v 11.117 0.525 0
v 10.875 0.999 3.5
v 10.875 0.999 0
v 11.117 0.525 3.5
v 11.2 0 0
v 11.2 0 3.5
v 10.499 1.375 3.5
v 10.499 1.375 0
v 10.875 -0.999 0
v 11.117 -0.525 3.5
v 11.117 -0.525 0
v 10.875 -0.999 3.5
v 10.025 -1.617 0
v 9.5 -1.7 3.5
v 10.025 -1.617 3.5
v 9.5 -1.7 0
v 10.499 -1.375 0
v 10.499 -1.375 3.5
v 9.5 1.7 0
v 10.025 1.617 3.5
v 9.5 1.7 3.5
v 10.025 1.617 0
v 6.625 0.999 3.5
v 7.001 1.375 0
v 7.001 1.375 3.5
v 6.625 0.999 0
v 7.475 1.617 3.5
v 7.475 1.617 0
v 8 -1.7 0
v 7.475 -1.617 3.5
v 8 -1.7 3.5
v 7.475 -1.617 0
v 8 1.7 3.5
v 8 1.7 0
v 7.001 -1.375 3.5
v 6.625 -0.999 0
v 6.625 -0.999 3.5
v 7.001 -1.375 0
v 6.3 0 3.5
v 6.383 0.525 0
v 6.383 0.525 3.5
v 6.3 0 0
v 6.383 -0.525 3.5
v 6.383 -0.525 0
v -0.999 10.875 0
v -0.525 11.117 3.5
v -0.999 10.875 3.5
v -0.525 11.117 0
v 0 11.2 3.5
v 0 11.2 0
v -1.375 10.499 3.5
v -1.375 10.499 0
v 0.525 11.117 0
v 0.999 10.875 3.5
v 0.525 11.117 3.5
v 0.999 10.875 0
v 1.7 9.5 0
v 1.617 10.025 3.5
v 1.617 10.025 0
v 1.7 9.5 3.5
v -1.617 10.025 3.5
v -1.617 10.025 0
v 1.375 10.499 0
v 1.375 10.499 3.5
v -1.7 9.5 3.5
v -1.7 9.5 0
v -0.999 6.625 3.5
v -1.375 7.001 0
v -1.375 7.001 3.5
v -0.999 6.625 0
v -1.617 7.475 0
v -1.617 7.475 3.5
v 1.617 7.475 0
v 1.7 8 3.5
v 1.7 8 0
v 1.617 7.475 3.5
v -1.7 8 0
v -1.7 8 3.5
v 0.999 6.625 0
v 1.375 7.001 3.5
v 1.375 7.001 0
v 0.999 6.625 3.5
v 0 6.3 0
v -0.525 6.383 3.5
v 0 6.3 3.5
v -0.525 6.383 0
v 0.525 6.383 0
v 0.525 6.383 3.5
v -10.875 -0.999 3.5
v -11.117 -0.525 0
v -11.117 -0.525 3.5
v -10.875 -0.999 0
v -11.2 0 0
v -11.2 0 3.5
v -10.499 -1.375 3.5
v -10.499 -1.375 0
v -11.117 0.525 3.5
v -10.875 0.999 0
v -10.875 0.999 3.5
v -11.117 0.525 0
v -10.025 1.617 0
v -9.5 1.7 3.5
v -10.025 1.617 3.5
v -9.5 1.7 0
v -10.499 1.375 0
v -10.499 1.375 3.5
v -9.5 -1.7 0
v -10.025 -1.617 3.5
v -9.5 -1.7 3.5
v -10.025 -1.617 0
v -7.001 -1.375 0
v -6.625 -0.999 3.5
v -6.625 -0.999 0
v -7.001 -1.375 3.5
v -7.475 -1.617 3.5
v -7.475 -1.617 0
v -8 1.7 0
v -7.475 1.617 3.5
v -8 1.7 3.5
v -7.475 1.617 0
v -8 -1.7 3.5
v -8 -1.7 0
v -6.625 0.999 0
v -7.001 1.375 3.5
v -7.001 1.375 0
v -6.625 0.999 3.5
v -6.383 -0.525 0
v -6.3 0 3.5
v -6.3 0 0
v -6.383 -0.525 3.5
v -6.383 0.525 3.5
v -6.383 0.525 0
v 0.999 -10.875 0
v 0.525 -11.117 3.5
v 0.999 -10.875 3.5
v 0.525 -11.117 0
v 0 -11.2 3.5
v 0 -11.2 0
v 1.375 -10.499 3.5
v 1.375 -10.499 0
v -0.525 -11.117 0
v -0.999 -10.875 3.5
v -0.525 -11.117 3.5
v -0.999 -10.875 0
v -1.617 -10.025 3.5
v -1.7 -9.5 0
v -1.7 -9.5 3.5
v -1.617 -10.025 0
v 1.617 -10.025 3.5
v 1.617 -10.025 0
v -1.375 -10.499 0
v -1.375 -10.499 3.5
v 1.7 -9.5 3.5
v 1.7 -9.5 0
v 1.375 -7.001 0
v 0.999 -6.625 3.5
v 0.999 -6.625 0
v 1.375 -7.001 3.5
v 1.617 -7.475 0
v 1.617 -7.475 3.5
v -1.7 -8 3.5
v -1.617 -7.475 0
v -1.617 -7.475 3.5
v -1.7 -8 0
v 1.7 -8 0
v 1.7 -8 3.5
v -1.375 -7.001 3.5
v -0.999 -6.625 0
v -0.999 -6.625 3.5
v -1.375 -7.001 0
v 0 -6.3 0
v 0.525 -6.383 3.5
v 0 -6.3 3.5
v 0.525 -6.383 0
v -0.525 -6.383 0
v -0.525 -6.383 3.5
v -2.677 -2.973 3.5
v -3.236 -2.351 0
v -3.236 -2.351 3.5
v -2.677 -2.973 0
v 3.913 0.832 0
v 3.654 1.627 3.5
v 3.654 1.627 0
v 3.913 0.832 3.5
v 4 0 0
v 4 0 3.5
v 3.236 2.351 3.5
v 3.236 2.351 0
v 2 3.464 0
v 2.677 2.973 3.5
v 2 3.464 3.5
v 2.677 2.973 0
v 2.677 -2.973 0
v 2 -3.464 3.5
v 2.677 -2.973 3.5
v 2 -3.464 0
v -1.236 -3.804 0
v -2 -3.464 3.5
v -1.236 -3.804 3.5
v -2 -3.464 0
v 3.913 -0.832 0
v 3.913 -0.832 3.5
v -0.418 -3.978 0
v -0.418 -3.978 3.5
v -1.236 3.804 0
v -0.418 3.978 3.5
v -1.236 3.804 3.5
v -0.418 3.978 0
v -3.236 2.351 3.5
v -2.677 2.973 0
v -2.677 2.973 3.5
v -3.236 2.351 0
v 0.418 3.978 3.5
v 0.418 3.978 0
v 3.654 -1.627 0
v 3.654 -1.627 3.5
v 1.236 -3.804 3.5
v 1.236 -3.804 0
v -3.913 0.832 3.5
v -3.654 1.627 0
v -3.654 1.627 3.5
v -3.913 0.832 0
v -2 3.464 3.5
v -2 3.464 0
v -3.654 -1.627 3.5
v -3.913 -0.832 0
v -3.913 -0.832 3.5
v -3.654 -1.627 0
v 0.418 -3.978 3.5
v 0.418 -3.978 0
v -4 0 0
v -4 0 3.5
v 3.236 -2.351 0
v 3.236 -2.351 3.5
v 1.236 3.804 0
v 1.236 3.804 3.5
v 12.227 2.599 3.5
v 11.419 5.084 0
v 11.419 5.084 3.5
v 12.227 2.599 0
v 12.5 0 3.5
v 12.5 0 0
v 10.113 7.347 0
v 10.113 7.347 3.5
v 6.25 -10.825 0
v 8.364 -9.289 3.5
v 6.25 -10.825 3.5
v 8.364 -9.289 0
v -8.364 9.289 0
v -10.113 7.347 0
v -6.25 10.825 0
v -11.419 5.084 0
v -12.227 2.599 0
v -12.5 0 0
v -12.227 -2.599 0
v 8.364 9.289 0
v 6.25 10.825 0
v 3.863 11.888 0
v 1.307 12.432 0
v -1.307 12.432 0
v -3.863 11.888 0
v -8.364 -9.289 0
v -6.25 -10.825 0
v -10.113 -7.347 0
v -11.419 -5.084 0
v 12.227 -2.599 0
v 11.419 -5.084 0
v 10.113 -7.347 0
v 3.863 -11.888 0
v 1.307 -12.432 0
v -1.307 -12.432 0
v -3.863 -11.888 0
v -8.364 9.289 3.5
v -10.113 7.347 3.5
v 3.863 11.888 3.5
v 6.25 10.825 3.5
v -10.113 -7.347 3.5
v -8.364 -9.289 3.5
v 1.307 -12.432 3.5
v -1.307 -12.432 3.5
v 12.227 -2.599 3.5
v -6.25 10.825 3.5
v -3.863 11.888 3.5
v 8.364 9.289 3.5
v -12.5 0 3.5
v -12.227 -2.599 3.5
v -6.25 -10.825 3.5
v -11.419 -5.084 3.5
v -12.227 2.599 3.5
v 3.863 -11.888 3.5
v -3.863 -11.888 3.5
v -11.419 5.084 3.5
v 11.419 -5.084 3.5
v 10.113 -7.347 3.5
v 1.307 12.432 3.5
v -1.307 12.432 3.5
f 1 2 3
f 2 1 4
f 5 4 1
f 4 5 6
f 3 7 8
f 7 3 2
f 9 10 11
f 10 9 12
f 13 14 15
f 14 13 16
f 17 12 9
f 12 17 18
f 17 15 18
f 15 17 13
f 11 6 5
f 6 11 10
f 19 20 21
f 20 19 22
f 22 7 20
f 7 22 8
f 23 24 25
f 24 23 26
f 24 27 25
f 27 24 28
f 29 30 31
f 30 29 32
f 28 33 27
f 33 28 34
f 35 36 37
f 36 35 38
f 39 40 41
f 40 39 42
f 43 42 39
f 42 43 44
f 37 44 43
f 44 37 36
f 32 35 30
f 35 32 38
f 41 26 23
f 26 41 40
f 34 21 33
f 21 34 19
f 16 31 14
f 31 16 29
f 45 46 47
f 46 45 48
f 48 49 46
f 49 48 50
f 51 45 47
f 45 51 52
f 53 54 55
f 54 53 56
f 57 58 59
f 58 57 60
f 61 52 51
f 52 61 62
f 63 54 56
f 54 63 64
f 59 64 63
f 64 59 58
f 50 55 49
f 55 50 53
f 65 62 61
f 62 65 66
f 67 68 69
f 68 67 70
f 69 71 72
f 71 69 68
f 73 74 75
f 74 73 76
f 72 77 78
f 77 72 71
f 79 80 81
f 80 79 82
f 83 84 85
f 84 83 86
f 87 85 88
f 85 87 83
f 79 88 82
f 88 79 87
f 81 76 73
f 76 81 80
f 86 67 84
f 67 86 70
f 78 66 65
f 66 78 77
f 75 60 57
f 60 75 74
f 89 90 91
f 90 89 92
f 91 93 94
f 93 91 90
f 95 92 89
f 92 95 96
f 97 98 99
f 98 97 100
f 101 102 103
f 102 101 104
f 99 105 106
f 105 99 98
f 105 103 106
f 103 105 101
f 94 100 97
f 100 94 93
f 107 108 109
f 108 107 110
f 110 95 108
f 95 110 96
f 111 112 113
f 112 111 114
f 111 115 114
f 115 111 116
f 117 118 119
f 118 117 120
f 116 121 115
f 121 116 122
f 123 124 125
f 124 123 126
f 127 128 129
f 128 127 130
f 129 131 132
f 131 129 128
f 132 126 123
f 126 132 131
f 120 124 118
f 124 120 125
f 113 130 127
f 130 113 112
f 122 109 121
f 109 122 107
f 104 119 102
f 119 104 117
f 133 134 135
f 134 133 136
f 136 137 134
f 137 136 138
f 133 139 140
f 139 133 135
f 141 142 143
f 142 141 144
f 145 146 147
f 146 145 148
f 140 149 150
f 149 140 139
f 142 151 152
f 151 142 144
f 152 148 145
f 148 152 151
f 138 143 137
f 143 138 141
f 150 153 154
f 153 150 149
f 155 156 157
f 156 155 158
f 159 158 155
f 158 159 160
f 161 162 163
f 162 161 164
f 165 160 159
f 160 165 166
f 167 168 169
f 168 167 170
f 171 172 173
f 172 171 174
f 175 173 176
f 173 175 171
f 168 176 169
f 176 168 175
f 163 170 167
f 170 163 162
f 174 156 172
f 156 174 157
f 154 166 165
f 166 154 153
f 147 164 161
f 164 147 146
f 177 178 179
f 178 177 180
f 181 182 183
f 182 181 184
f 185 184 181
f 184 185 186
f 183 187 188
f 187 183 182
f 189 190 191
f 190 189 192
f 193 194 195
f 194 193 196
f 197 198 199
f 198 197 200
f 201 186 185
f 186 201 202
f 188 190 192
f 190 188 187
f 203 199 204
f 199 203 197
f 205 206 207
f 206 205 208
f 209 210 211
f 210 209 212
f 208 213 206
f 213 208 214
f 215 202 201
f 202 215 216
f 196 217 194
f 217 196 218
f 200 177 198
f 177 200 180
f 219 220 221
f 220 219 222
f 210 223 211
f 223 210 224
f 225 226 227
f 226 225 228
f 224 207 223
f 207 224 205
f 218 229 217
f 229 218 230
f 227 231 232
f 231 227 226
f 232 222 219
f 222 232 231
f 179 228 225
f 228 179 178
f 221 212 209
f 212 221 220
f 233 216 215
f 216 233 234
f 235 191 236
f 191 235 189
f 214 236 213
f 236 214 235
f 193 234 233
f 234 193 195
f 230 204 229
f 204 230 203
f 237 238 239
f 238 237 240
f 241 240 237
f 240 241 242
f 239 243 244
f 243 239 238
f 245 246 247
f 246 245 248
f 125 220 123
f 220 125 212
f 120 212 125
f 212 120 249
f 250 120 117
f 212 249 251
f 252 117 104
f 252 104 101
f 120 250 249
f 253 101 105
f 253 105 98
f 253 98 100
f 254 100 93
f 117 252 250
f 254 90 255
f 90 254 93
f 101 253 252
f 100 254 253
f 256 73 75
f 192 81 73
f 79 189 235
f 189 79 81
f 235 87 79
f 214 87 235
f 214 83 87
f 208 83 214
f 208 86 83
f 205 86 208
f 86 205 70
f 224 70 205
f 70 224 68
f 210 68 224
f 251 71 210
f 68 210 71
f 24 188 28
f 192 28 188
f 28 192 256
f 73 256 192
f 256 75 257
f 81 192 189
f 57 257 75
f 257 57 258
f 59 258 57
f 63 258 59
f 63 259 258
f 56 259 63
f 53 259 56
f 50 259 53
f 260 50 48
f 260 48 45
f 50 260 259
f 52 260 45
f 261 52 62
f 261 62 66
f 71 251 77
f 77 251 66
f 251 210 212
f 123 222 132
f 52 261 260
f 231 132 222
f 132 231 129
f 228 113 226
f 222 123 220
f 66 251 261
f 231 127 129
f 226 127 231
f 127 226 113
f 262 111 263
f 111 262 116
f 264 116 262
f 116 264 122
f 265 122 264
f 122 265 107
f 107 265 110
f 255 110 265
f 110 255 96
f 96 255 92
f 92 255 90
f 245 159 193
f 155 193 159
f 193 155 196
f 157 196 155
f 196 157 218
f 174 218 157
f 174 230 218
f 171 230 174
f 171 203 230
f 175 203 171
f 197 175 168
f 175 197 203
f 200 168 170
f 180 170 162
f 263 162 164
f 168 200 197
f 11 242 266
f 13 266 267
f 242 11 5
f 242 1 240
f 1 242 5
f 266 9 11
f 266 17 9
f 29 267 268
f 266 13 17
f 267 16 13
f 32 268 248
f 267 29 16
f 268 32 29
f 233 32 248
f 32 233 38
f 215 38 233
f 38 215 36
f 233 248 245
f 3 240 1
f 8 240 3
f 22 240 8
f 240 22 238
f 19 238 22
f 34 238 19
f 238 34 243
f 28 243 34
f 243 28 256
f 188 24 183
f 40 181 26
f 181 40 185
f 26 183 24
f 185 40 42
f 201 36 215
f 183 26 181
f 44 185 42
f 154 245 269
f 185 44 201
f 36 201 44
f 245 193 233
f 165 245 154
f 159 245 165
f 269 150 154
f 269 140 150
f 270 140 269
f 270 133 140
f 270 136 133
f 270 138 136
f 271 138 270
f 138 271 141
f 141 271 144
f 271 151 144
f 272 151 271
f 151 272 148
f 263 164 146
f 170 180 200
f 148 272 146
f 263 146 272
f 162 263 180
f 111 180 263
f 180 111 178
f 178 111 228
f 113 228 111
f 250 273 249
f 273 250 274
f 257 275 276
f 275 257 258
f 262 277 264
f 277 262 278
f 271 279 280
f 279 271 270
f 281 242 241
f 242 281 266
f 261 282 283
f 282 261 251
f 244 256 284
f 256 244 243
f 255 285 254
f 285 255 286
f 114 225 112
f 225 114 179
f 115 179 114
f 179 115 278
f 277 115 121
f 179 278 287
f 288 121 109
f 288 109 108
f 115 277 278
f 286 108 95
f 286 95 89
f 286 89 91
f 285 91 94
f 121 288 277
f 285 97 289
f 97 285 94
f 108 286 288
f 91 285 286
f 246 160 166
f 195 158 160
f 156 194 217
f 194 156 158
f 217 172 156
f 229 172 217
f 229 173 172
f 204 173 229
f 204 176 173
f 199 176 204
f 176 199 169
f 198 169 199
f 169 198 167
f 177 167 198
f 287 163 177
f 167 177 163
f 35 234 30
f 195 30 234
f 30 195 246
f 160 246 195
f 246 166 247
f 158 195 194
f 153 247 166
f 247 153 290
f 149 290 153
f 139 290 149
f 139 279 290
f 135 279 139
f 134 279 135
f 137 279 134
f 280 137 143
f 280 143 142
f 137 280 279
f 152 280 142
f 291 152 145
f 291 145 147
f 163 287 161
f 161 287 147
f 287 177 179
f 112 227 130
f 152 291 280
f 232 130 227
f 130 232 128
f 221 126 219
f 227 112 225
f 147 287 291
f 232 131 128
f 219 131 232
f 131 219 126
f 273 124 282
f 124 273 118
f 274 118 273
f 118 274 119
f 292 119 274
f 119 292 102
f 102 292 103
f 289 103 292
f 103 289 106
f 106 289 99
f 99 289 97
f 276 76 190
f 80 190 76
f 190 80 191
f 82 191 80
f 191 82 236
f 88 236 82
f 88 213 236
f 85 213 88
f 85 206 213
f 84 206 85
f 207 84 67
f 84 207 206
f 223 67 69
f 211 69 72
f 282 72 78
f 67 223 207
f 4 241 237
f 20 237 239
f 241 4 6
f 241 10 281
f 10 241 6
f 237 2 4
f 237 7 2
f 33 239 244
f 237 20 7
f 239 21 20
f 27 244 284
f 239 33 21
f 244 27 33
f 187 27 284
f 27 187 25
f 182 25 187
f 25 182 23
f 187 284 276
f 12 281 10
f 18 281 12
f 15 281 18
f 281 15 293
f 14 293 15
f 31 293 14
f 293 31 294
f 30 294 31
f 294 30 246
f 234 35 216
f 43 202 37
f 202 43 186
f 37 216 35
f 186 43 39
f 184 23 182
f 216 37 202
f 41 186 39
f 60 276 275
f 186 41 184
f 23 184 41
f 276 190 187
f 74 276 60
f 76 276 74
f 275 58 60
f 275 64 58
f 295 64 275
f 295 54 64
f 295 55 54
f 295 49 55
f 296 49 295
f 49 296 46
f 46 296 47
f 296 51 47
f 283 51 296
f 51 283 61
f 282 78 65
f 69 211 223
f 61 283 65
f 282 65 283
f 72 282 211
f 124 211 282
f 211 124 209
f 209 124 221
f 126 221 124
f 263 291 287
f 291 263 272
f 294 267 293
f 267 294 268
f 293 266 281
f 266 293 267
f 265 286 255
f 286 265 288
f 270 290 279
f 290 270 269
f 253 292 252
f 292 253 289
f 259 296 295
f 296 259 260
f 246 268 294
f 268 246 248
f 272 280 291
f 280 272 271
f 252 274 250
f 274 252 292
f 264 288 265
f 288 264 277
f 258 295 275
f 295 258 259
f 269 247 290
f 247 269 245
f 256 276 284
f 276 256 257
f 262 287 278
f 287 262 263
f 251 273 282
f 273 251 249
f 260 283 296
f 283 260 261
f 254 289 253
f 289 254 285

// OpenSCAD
/**
 * dronePlates.scad
 * Plate library
 *
 * GNU GPL V3
 * @author: Victor Potenciano
 */

m3Rad = 3.4/2;
cornerR = 4;

/**
 *
 */
module helperDisk(diameter) {
	cylinder(r = diameter/2, h = 0.6, $fn=20);
}

/**
 *
 */
module roundedRect(size, radius) {
	x = size[0];
	y = size[1];
	z = size[2];

	linear_extrude(height=z)
	hull() {
	// place 4 circles in the corners, with the given radius
	translate([(-x/2)+(radius/2), (-y/2)+(radius/2), 0]){ circle(r=radius); }
	translate([(x/2)-(radius/2), (-y/2)+(radius/2), 0]){ circle(r=radius); }
	translate([(-x/2)+(radius/2), (y/2)-(radius/2), 0]){ circle(r=radius); }
	translate([(x/2)-(radius/2), (y/2)-(radius/2), 0]){ circle(r=radius); }
	}
}

/**
 * rounded rectangle triangle with corner at origin
 */
module roundedTriangle(size, radius) {
	x = size[0];
	y = size[1];
	z = size[2];

	linear_extrude(height=z)
	hull() {
	translate([radius, radius, 0]){ circle(r=radius); }
	translate([x-radius, radius, 0]){ circle(r=radius); }
	translate([radius, y-radius, 0]){ circle(r=radius); }
	}
}

/**
 *
 */
module roundRectPlate(w, l, plateThick=3) {
	difference(){
		roundedRect([l+m3Rad*1.75,w+m3Rad*1.75,plateThick], cornerR);
		translate([l/2, w/2, -0.5]) { cylinder(h = plateThick+1, r = m3Rad, $fn=30); }
		translate([-l/2, w/2, -0.5]) { cylinder(h = plateThick+1, r = m3Rad, $fn=30); }
		translate([l/2, -w/2, -0.5]) { cylinder(h = plateThick+1, r = m3Rad, $fn=30); }
		translate([-l/2, -w/2, -0.5]) { cylinder(h = plateThick+1, r = m3Rad, $fn=30); }
	}
}

/**
 *
 */
module crossSquarePlate(l, thick=3) {
	inDist = cornerR*2+4;
	trianL = sqrt((l*l)/2)-inDist;
	centerR = 4;

	difference(){
		roundRectPlate(l, l, thick);
		translate([0, centerR, -0.5]) { 
			rotate([0,0,45]){ roundedTriangle([trianL,trianL,thick+1], cornerR-2); }
		}
		translate([0, -centerR, -0.5]) { 
			rotate([0,0,225]){ roundedTriangle([trianL,trianL,thick+1], cornerR-2); }
		}
		translate([-centerR, 0, -0.5]) { 
			rotate([0,0,135]){ roundedTriangle([trianL,trianL,thick+1], cornerR-2); }
		}
		translate([centerR, 0, -0.5]) { 
			rotate([0,0,-45]){ roundedTriangle([trianL,trianL,thick+1], cornerR-2); }
		}
	}
}

/**
 *
 */
module hShapePlate(w, l, thick=4) {
	inDist = cornerR*2+1;

	difference(){
		roundRectPlate(w, l, thick);
		translate([0, w/4, -0.5]) { roundedRect([l-inDist,w/2-inDist,thick+1], cornerR-2); }
		translate([0, -w/4, -0.5]) { roundedRect([l-inDist,w/2-inDist,thick+1], cornerR-2); }
	}
}

/**
 *
 */
module motorCircleMount(inDia, outDia, thick=3, extraH=false, d1=19, d2=16, holeR=m3Rad ) {
	difference(){
		cylinder(h = thick, r = outDia/2, $fn=30);
		motorCircleMountHoles(inDia, outDia, thick, extraH, d1=d1, d2=d2, holeR=holeR);
	}
}

/**
 *
 */
module motorCircleMountHoles(inDia, outDia, thick=3, extraH=false, d1=19, d2=16, d3=25, holeR=m3Rad) {
	translate([0, 0, -0.5]) { cylinder(h = thick+1, r = inDia/2, $fn=30); }

	for(i=[0:3]) {
		rotate([0,0,90*i]){
		translate([d1/2, 0, -0.5]) cylinder(h = thick+1, r = holeR, $fn=20);
		translate([d2/2, 0, -0.5]) cylinder(h = thick+1, r = holeR, $fn=20);
		translate([d2/2, -holeR, -0.5]) cube(size = [(d1-d2)/2,holeR*2,thick+1]);
		}
	}
	
	if(extraH==true){	
		for(i=[-1,1]) translate([i*d3/2, 0, -0.5]) { cylinder(h = thick+1, r = holeR, $fn=30); }
	}
}

/**
 *
 */
module motorRectMount(w, l, inDia, thick=3) {
	d1=19;
	d2=16;

	difference(){
		roundRectPlate(w, l, thick);
		translate([0, 0, -0.5]) { cylinder(h = thick+1, r = inDia/2, $fn=30); }
		translate([0, d1/2, -0.5]) { cylinder(h = thick+1, r = m3Rad, $fn=30); }
		translate([0, -d1/2, -0.5]) { cylinder(h = thick+1, r = m3Rad, $fn=30); }
		translate([d2/2, 0, -0.5]) { cylinder(h = thick+1, r = m3Rad, $fn=30); }
		translate([-d2/2, 0, -0.5]) { cylinder(h = thick+1, r = m3Rad, $fn=30); }
	}
}

/**
 *
 */
module tube(inDia, outDia, height) {
	difference(){
		cylinder(h = height, r = outDia/2, $fn=50);
		translate([0, 0, -0.5]) { cylinder(h = height+1, r = inDia/2, $fn=30); }
	}
}

/**
 *
 */
module squareTube(inDia, outDia, height) {
	translate([0,0,height/2]){
	difference(){
		cube(size = [outDia,outDia,height], center = true);
		cube(size = [inDia,inDia,height+1], center = true);
	}
	}
}

/**
 *
 */
module djiFlamewheelHoles(height) {
	a = 23;
	b = 16;
	c = 19.5;
	
	translate([a/2, c/2, 0]) { cylinder(h = height, r = m3Rad, $fn=30); }
	translate([-a/2, c/2, 0]) { cylinder(h = height, r = m3Rad, $fn=30); }
	translate([b/2, -c/2, 0]) { cylinder(h = height, r = m3Rad, $fn=30); }
	translate([-b/2, -c/2, 0]) { cylinder(h = height, r = m3Rad, $fn=30); }
}

/**
 *
 */
module djiFlamewheelHolesBotton(height) {
	a1 = 21;
	c = 19.5;
	
	translate([a1/2, c/2, 0]) { cylinder(h = height, r = m3Rad, $fn=30); }
	translate([-a1/2, c/2, 0]) { cylinder(h = height, r = m3Rad, $fn=30); }
}

/**
 *
 */
module propeller(size){
union(){
difference(){
	cylinder(h = 3, r = size/2, center=true, $fn=30);
	cylinder(h = 3.1, r = size/2-2, center=true, $fn=30); 
}
for( i = [-1,1] ){
rotate([0,0,45*i]){ cube(size = [size,4,1], center = true); }
}
}
}

/**
 *
 */
module slot(length, height, rad){
for(i=[-1,1]) translate([i*length/2,0,0]) cylinder(h = height, r = rad, $fn=30);
translate([0,0,height/2]) cube(size = [length,rad*2,height], center = true);
}

 

////////////////////////
// Examples:
////////////////////////

motorCircleMount(8, 25, 3.5);

//roundedRect([50,50,3], 4);

//hShapePlate(79, 25);

//rotate([0,0,45]){roundedTriangle([40,40,3], 4);}

//crossSquarePlate(45, 4);

/*
union(){
motorRectMount(21, 18, 8, 4);
translate([9, 10.5, 0]) {tube(m3Rad*2, 6.5, 6);}
}
*/

/*
difference(){
union(){
hShapePlate(50, 30, 3.5);
translate([-4,-25,0]){cube(size = [8,50,3.5]);}
rotate([0, 0, 45]) {motorCircleMount(8, 35, 3.5);}
}
cylinder(h = 10, r = 4, $fn=100, center=true);
}
*/

//rotate([90,0,0]){ tube(5,10,20); }
//translate([20,0,0]){ squareTube(5, 10, 20); }
